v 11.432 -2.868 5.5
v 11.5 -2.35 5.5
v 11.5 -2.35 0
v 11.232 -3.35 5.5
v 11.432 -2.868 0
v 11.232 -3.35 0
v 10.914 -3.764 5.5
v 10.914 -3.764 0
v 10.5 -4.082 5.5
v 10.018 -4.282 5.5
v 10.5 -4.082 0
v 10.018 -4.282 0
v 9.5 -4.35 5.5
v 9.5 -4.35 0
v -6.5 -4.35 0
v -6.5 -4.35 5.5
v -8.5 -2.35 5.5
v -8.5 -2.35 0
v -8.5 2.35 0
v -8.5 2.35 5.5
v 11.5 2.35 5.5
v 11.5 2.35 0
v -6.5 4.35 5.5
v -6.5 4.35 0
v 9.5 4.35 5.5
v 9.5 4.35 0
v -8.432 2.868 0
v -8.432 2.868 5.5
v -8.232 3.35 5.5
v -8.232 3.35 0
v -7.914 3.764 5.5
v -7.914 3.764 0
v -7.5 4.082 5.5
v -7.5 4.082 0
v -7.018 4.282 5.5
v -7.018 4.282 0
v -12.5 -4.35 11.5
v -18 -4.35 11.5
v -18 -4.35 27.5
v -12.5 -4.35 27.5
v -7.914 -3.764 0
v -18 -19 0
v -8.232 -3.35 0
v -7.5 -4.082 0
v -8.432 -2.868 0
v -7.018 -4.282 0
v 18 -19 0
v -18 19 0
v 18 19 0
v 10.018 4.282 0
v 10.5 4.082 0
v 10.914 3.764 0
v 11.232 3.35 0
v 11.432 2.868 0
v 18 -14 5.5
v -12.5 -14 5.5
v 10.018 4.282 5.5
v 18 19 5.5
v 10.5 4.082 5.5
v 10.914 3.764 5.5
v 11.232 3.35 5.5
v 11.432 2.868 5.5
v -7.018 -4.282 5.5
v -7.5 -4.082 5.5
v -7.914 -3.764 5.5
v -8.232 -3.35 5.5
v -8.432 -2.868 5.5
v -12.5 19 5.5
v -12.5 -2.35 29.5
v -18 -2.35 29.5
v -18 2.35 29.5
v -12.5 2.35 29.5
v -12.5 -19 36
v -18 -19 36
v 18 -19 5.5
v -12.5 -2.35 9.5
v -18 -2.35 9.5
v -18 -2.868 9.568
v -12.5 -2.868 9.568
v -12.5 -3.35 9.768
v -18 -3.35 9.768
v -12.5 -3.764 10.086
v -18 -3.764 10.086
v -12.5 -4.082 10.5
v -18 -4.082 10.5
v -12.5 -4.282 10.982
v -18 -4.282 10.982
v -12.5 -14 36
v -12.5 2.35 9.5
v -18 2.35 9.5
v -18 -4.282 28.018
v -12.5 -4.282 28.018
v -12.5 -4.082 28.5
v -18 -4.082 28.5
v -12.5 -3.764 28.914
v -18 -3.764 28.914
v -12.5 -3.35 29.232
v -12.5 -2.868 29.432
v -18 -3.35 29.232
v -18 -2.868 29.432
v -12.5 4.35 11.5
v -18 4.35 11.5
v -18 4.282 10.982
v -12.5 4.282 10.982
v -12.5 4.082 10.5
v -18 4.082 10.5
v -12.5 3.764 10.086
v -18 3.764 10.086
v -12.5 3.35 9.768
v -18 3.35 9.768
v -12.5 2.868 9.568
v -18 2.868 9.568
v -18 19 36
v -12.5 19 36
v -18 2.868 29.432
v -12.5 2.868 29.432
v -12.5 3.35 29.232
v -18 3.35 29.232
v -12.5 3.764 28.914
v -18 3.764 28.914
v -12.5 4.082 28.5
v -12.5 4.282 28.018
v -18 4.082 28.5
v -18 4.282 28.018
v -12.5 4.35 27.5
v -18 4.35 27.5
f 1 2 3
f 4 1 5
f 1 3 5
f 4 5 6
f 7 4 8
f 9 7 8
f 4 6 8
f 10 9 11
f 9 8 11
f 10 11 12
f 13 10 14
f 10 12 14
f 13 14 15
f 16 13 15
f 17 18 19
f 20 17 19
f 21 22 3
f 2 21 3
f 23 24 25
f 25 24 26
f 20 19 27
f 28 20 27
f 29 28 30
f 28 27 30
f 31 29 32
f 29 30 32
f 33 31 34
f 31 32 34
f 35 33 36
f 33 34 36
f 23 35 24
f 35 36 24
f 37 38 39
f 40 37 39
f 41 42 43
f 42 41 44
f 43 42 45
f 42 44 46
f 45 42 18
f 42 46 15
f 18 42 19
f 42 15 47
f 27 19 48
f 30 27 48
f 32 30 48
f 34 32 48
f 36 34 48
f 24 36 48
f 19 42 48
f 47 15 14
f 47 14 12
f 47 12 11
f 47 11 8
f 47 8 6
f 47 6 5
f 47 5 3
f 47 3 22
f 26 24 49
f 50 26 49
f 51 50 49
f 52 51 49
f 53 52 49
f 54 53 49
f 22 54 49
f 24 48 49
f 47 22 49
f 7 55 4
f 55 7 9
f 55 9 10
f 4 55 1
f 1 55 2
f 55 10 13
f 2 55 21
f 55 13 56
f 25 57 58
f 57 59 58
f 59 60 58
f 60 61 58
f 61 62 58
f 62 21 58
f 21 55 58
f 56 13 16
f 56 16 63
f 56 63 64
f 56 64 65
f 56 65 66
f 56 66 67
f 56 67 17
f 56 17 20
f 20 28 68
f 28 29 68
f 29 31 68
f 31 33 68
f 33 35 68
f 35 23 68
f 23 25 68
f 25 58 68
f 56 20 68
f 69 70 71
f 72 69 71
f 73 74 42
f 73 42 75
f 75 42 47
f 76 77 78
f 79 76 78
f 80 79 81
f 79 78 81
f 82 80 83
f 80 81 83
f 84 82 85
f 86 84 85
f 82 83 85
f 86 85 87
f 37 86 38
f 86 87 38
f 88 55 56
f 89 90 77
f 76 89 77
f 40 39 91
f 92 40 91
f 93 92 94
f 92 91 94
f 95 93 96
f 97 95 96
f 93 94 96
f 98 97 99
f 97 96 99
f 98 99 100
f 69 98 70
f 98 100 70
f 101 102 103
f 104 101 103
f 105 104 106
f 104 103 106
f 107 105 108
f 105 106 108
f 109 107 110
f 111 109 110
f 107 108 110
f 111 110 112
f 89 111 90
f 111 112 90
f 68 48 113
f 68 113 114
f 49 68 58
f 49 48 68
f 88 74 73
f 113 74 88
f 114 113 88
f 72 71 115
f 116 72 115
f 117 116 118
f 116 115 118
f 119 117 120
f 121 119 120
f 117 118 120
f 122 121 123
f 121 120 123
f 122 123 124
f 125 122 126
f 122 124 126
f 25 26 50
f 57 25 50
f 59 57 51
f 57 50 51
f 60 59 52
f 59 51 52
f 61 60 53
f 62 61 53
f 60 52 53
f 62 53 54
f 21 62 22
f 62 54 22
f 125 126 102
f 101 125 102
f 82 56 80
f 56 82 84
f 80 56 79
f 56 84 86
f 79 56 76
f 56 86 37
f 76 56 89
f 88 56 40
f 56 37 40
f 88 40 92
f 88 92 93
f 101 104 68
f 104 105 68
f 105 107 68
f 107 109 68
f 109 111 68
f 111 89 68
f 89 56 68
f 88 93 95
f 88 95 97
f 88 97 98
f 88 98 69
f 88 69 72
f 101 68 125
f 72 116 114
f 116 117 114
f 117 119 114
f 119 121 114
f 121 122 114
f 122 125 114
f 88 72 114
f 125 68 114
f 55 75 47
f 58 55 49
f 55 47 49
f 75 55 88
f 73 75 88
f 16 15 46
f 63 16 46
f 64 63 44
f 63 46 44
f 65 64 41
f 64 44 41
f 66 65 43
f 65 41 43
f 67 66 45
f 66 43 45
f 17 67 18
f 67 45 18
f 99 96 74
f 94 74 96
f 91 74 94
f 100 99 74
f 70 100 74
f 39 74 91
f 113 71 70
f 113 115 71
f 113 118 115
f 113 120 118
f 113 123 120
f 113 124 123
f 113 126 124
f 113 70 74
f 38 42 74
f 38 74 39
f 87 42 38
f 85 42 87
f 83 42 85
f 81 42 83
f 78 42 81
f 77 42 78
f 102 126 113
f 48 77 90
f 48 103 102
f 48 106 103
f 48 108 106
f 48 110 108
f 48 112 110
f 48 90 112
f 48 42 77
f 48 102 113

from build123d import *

# Parameters (mm, degrees)
F0_W     = 36
F0_H     = 38
F1_DEPTH = 36
F3_DEPTH = 38.001
F4_DEPTH = 33
F6_DEPTH = 36.001


with BuildPart() as f1:
    # F0 (on Top) → F1 (new body)
    with BuildSketch(Plane.XY):
        Rectangle(F0_W, F0_H)
        with BuildLine():
            ThreePointArc((-8.5, 2.35), (-7.914214, 3.764214), (-6.5, 4.35))
            Line((-6.5, 4.35), (9.5, 4.35))
            ThreePointArc((9.5, 4.35), (10.914214, 3.764214), (11.5, 2.35))
            Line((11.5, 2.35), (11.5, -2.35))
            ThreePointArc((11.5, -2.35), (10.914214, -3.764214), (9.5, -4.35))
            Line((9.5, -4.35), (-6.5, -4.35))
            ThreePointArc((-6.5, -4.35), (-7.914214, -3.764214), (-8.5, -2.35))
            Line((-8.5, -2.35), (-8.5, 2.35))
        make_face(mode=Mode.SUBTRACT)
    extrude(amount=F1_DEPTH)

    # F2 (on face) → F3 (cut, through all)
    with BuildSketch(Plane(origin=(0, 19, 0), x_dir=(-1, 0, 0), z_dir=(0, 1, 0))):
        Polygon((-18, 5.5), (12.5, 36), (-18, 36), align=None)
    extrude(amount=-F3_DEPTH, mode=Mode.SUBTRACT)

    # F2 (on face) → F4 (cut)
    with BuildSketch(Plane(origin=(0, 19, 0), x_dir=(-1, 0, 0), z_dir=(0, 1, 0))):
        Polygon((12.5, 5.5), (12.5, 36), (-18, 5.5), align=None)
    extrude(amount=-F4_DEPTH, mode=Mode.SUBTRACT)

    # F5 (on face) → F6 (cut, through all)
    with BuildSketch(Plane(origin=(-18, 0, 0), x_dir=(0, -1, 0), z_dir=(-1, 0, 0))):
        with BuildLine():
            Line((2.35, 29.5), (-2.35, 29.5))
            ThreePointArc((-2.35, 29.5), (-3.764214, 28.914214), (-4.35, 27.5))
            Line((-4.35, 27.5), (-4.35, 11.5))
            ThreePointArc((-4.35, 11.5), (-3.764214, 10.085786), (-2.35, 9.5))
            Line((-2.35, 9.5), (2.35, 9.5))
            ThreePointArc((2.35, 9.5), (3.764214, 10.085786), (4.35, 11.5))
            Line((4.35, 11.5), (4.35, 27.5))
            ThreePointArc((4.35, 27.5), (3.764214, 28.914214), (2.35, 29.5))
        make_face()
    extrude(amount=-F6_DEPTH, mode=Mode.SUBTRACT)


solid = f1.part
